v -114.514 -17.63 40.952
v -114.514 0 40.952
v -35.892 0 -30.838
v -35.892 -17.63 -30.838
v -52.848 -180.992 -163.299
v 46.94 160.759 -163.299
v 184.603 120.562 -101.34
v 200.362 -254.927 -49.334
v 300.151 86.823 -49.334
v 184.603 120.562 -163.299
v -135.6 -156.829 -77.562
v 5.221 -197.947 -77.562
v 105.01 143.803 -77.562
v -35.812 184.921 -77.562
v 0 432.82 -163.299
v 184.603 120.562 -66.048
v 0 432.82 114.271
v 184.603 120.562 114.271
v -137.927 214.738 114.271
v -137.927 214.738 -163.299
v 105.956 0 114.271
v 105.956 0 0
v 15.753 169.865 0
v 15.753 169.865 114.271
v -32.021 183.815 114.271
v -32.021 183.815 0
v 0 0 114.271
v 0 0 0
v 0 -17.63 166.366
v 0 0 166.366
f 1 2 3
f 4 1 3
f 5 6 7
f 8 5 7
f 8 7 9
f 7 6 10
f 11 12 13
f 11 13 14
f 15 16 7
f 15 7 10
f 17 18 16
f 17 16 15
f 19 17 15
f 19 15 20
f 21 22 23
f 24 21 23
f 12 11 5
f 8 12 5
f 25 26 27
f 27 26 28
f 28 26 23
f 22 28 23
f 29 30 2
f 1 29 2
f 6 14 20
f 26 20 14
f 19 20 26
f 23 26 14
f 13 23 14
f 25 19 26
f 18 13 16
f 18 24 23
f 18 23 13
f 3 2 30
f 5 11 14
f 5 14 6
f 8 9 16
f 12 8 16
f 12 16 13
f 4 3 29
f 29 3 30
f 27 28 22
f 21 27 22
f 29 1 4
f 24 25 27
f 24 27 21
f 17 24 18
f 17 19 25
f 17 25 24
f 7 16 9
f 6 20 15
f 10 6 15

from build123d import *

# Parameters (mm, degrees)
F1_DEPTH = 17.6301095635
F3_DEPTH = 114.2712011933
F5_DEPTH = 277.5703370571
F7_DEPTH = 356.0210168362


with BuildPart() as f1:
    # F0 (on Front) → F1 (new body)
    with BuildSketch(Plane.XZ):
        Polygon((-35.8915419667, -30.8375303411), (0, 166.366070509), (-114.5141869783, 40.9518331289), align=None)
    extrude(amount=F1_DEPTH)


with BuildPart() as f3:
    # F2 (on Top) → F3 (new body)
    with BuildSketch(Plane.XY):
        Polygon((-51.7277568579, 296.9393134117), (0, 0), (105.9562191367, 0), align=None)
    extrude(amount=F3_DEPTH)

    # F4 (on face) → F5 (join)
    with BuildSketch(Plane.XY.offset(114.2712011933)):
        Polygon((184.6031248569, 120.5621361732), (0, 432.8200817108), (-137.9265487194, 214.7382646799), align=None)
    extrude(amount=-F5_DEPTH)

    # F6 (on face) → F7 (join)
    with BuildSketch(Plane(origin=(46.9402508542, 160.7586128848, 0), x_dir=(0.9599159773, -0.2802879172, 0), z_dir=(-0.2802879172, -0.9599159773, 0))):
        Polygon((198.4482820092, -77.561751008), (60.4942813516, -77.561751008), (-86.2073600292, -77.561751008), (0, -163.2991358638), align=None)
        Polygon((263.7838125229, -49.3342578411), (60.4942813516, -77.561751008), (198.4482820092, -77.561751008), align=None)
        Polygon((143.4113789723, -77.561751008), (60.4942813516, -77.561751008), (-86.2073600292, -77.561751008), (0, -163.2991358638), (143.4113789723, -101.3398361049), align=None)
    extrude(amount=F7_DEPTH)


solid = Compound([f1.part, f3.part])
